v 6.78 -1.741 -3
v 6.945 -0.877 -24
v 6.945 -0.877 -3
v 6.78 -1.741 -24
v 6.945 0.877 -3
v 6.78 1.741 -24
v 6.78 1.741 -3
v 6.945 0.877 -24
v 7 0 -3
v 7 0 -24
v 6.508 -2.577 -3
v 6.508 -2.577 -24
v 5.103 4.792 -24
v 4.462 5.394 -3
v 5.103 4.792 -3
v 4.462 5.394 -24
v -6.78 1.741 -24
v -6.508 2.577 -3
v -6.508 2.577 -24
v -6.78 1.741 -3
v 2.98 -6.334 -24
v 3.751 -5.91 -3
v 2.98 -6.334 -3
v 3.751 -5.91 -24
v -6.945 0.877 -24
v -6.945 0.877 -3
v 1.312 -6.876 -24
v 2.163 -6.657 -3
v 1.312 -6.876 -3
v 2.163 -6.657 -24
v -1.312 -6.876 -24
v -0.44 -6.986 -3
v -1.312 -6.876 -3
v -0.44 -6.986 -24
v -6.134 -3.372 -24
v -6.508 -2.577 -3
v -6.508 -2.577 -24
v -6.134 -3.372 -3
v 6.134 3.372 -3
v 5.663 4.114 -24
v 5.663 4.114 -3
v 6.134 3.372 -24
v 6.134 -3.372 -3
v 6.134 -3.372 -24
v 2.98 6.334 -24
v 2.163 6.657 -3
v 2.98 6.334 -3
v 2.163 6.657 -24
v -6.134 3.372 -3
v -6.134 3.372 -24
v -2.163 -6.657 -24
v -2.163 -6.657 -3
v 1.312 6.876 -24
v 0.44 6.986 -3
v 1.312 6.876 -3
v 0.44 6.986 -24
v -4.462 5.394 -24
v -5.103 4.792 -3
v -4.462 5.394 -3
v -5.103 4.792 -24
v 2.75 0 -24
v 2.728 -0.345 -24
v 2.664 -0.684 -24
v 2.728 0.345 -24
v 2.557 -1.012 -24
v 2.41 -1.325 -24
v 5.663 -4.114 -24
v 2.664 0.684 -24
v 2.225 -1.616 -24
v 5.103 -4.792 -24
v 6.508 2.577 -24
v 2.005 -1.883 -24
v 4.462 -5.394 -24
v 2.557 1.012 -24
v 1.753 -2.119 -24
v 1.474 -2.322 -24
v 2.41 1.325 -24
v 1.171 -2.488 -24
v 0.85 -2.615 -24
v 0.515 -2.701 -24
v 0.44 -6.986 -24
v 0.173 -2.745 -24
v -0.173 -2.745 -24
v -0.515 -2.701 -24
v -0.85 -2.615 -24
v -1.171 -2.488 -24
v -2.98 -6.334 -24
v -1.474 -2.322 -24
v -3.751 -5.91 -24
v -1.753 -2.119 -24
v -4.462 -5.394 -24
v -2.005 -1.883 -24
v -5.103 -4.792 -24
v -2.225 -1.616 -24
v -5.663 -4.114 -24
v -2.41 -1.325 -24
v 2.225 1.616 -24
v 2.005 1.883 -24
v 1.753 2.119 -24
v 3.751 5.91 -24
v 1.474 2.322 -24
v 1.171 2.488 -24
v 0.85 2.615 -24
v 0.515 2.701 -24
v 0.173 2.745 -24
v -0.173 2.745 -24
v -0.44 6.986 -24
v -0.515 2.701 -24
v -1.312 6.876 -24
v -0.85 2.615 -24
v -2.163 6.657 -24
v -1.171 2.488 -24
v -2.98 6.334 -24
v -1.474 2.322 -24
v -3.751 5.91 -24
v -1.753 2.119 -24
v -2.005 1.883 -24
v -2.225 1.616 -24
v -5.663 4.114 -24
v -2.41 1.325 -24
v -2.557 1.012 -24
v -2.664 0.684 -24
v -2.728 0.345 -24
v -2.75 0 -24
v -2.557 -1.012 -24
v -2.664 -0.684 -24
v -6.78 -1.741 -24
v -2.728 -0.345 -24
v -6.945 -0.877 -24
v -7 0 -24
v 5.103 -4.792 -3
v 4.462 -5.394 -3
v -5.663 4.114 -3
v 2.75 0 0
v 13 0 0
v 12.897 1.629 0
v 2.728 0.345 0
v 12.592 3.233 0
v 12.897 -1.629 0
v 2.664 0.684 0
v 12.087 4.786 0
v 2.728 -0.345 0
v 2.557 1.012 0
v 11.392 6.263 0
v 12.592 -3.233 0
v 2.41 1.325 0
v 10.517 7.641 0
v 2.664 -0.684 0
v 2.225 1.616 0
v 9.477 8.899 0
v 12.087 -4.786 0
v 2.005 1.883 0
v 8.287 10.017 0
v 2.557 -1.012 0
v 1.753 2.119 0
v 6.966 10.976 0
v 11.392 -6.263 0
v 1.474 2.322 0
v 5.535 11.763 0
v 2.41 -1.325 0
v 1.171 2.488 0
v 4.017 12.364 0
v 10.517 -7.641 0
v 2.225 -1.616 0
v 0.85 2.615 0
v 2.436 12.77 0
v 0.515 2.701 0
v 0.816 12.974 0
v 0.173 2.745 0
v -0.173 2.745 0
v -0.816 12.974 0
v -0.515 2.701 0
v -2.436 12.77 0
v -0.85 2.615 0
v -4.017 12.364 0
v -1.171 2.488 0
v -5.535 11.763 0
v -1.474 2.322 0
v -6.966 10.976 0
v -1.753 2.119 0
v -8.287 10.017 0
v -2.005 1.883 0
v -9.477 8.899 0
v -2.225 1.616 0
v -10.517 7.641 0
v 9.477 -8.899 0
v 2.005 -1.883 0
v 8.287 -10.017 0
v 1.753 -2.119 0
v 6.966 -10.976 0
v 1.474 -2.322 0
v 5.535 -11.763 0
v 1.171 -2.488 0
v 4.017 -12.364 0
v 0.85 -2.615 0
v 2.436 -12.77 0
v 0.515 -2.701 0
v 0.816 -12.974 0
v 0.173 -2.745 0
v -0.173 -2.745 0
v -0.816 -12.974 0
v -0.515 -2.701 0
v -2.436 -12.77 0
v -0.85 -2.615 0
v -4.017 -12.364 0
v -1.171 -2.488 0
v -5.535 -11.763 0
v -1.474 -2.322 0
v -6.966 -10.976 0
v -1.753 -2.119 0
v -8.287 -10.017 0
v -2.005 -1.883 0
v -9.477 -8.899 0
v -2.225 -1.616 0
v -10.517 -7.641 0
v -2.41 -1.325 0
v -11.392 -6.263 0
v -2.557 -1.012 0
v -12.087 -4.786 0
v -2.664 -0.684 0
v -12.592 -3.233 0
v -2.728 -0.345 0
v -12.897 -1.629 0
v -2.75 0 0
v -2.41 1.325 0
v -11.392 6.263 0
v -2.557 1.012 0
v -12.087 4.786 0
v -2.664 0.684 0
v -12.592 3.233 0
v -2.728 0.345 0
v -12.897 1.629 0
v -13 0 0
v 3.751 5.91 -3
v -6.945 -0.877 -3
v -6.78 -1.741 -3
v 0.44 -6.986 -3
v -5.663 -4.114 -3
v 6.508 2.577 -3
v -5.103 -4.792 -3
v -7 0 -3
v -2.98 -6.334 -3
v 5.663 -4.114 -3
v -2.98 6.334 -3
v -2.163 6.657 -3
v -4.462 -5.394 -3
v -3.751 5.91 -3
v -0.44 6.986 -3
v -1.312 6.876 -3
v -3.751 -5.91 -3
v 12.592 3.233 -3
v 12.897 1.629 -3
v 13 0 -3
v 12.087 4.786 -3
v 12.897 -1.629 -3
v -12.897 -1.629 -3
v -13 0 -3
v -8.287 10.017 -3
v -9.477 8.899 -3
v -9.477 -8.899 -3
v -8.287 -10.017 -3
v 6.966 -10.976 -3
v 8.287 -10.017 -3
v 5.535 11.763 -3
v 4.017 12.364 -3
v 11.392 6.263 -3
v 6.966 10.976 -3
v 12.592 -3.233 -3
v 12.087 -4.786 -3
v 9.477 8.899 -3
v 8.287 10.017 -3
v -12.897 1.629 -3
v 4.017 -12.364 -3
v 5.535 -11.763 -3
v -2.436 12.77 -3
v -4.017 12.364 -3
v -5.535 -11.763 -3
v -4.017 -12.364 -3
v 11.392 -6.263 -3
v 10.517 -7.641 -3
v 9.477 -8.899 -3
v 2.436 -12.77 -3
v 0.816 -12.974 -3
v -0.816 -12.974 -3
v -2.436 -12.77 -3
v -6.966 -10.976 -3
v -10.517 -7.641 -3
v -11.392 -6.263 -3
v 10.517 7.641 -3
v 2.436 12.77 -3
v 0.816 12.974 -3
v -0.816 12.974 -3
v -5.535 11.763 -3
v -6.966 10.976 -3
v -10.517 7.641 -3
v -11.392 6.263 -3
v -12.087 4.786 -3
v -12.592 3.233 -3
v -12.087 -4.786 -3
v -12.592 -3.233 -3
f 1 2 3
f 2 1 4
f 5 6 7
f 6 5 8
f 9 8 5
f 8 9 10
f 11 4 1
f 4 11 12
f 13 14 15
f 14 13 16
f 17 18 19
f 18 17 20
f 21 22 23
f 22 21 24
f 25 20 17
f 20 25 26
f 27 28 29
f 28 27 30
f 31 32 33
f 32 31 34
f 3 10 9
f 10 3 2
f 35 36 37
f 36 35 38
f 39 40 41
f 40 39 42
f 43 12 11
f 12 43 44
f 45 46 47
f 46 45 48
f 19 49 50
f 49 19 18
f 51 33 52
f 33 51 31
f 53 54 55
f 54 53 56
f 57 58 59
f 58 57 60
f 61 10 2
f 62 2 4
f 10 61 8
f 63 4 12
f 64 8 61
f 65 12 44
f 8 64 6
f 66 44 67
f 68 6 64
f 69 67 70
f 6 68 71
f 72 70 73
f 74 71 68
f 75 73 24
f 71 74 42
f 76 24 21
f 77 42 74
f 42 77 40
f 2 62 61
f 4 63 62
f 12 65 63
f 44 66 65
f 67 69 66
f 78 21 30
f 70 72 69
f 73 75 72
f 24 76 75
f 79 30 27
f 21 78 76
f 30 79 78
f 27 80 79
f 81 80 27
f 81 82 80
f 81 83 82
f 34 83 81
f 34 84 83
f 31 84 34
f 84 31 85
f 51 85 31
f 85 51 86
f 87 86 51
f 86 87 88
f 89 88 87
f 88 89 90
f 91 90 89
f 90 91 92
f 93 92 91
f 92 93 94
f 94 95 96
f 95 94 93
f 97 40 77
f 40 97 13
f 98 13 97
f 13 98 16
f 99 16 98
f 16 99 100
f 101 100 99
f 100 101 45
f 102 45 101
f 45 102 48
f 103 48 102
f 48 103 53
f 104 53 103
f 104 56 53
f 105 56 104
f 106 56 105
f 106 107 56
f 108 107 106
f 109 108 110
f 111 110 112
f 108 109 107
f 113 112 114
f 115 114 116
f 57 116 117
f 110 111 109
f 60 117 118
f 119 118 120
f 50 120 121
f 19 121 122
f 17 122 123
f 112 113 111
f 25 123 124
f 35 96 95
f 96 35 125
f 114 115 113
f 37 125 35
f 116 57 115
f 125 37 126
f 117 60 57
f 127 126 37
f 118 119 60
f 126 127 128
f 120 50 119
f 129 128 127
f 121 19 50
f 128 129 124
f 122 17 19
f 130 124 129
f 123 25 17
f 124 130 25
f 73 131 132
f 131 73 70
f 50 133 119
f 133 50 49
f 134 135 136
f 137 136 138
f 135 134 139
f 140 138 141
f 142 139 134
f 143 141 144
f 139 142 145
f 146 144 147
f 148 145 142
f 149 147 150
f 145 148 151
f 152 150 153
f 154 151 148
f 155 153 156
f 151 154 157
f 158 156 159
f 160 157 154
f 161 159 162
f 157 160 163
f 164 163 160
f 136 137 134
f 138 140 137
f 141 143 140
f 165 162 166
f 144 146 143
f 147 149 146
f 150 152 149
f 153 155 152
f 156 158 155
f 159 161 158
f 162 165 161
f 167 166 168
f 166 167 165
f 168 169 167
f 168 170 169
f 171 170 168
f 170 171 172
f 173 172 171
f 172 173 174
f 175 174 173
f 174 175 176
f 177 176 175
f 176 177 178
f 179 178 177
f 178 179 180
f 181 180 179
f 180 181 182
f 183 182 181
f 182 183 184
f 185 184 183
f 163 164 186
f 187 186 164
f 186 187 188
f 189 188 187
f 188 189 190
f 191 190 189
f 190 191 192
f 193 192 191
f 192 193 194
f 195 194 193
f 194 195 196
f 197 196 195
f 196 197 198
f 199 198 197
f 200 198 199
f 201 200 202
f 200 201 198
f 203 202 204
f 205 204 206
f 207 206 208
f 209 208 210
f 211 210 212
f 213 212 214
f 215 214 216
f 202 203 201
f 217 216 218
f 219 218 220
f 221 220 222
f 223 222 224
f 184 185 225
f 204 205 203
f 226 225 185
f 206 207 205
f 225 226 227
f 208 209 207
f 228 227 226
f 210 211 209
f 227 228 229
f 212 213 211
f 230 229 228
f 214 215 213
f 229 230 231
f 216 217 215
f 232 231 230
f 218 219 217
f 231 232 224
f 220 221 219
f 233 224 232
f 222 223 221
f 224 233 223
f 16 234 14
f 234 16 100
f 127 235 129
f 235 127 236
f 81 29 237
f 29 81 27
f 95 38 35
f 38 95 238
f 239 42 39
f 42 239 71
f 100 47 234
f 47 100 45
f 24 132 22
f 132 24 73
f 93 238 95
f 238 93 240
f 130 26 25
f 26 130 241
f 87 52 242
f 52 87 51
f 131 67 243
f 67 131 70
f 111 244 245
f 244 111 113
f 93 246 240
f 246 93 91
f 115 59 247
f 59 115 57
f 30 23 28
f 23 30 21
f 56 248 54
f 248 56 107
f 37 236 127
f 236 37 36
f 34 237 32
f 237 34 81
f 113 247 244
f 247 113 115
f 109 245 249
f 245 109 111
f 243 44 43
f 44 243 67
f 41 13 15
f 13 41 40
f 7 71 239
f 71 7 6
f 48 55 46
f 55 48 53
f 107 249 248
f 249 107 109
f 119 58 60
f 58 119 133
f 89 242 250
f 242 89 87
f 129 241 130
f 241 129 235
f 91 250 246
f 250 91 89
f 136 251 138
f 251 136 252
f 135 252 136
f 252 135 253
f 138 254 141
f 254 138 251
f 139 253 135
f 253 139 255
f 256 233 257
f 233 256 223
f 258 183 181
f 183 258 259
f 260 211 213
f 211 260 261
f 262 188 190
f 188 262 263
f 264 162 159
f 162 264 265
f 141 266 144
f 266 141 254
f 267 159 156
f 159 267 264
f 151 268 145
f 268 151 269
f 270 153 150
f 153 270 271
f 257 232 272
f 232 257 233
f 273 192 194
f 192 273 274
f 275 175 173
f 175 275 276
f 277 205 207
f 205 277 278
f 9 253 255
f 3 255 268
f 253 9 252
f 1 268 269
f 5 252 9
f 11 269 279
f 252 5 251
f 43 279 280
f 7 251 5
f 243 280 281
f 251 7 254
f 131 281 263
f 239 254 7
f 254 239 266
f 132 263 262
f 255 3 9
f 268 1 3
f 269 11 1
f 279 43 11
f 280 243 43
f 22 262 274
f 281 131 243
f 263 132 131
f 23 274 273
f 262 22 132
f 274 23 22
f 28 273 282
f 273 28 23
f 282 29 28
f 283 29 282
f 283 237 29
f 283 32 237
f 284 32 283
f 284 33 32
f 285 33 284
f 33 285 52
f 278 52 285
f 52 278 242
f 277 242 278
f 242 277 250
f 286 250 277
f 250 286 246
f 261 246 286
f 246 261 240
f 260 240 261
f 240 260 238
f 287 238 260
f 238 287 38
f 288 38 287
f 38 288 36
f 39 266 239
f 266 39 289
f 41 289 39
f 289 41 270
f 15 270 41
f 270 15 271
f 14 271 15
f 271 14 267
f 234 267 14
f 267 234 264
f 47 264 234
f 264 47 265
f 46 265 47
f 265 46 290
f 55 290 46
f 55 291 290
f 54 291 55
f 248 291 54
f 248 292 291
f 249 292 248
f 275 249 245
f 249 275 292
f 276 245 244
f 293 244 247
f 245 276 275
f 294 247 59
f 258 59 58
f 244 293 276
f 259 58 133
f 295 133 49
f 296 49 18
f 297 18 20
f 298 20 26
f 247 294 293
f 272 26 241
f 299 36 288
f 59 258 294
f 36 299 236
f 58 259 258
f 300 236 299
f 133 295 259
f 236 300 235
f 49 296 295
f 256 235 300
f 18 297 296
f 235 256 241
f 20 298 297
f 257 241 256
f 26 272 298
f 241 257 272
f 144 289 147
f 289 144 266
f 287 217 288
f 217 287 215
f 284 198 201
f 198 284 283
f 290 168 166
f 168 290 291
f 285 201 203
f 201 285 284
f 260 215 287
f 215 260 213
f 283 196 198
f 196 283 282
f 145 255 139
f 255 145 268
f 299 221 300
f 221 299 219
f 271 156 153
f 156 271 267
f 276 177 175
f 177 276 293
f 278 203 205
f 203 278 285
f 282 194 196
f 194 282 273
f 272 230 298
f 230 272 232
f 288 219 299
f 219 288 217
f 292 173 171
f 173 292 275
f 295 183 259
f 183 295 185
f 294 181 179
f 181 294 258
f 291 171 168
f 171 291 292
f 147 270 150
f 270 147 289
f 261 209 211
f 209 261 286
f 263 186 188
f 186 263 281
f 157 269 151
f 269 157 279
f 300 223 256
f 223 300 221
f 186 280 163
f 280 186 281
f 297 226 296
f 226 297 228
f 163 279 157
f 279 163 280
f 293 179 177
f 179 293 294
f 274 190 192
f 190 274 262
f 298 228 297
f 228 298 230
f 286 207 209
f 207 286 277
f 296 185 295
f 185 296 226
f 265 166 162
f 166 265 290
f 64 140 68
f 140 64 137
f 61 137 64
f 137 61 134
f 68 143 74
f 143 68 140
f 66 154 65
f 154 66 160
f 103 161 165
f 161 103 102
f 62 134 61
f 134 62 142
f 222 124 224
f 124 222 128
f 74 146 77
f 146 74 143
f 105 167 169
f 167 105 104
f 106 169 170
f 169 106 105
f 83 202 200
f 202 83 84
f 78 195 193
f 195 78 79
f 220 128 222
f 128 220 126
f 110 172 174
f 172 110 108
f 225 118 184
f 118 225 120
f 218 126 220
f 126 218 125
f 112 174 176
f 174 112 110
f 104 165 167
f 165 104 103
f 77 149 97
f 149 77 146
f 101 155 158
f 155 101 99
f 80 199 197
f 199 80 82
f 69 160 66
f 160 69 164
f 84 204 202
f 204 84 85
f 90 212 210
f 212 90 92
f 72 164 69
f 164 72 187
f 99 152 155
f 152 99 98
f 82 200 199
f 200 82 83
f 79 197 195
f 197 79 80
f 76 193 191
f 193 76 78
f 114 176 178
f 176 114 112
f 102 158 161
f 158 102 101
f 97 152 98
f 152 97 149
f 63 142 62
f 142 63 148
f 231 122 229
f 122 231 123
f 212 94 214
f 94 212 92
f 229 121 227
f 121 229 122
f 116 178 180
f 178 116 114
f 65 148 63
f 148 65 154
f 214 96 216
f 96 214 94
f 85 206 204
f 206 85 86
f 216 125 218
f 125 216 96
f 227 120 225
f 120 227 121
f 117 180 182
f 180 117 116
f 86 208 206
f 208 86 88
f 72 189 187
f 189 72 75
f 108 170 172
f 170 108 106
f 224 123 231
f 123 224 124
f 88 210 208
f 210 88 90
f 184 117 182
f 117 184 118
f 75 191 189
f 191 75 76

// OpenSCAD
$fn = 50;


difference() {
	union() {
		translate(v = [0, 0, -24.0000000000]) {
			cylinder(h = 24, r = 7.0000000000);
		}
		translate(v = [0, 0, -3.0000000000]) {
			cylinder(h = 3, r = 13.0000000000);
		}
	}
	union() {
		#translate(v = [0, 0, -24]) {
			cylinder(h = 24, r = 2.7500000000);
		}
	}
}
